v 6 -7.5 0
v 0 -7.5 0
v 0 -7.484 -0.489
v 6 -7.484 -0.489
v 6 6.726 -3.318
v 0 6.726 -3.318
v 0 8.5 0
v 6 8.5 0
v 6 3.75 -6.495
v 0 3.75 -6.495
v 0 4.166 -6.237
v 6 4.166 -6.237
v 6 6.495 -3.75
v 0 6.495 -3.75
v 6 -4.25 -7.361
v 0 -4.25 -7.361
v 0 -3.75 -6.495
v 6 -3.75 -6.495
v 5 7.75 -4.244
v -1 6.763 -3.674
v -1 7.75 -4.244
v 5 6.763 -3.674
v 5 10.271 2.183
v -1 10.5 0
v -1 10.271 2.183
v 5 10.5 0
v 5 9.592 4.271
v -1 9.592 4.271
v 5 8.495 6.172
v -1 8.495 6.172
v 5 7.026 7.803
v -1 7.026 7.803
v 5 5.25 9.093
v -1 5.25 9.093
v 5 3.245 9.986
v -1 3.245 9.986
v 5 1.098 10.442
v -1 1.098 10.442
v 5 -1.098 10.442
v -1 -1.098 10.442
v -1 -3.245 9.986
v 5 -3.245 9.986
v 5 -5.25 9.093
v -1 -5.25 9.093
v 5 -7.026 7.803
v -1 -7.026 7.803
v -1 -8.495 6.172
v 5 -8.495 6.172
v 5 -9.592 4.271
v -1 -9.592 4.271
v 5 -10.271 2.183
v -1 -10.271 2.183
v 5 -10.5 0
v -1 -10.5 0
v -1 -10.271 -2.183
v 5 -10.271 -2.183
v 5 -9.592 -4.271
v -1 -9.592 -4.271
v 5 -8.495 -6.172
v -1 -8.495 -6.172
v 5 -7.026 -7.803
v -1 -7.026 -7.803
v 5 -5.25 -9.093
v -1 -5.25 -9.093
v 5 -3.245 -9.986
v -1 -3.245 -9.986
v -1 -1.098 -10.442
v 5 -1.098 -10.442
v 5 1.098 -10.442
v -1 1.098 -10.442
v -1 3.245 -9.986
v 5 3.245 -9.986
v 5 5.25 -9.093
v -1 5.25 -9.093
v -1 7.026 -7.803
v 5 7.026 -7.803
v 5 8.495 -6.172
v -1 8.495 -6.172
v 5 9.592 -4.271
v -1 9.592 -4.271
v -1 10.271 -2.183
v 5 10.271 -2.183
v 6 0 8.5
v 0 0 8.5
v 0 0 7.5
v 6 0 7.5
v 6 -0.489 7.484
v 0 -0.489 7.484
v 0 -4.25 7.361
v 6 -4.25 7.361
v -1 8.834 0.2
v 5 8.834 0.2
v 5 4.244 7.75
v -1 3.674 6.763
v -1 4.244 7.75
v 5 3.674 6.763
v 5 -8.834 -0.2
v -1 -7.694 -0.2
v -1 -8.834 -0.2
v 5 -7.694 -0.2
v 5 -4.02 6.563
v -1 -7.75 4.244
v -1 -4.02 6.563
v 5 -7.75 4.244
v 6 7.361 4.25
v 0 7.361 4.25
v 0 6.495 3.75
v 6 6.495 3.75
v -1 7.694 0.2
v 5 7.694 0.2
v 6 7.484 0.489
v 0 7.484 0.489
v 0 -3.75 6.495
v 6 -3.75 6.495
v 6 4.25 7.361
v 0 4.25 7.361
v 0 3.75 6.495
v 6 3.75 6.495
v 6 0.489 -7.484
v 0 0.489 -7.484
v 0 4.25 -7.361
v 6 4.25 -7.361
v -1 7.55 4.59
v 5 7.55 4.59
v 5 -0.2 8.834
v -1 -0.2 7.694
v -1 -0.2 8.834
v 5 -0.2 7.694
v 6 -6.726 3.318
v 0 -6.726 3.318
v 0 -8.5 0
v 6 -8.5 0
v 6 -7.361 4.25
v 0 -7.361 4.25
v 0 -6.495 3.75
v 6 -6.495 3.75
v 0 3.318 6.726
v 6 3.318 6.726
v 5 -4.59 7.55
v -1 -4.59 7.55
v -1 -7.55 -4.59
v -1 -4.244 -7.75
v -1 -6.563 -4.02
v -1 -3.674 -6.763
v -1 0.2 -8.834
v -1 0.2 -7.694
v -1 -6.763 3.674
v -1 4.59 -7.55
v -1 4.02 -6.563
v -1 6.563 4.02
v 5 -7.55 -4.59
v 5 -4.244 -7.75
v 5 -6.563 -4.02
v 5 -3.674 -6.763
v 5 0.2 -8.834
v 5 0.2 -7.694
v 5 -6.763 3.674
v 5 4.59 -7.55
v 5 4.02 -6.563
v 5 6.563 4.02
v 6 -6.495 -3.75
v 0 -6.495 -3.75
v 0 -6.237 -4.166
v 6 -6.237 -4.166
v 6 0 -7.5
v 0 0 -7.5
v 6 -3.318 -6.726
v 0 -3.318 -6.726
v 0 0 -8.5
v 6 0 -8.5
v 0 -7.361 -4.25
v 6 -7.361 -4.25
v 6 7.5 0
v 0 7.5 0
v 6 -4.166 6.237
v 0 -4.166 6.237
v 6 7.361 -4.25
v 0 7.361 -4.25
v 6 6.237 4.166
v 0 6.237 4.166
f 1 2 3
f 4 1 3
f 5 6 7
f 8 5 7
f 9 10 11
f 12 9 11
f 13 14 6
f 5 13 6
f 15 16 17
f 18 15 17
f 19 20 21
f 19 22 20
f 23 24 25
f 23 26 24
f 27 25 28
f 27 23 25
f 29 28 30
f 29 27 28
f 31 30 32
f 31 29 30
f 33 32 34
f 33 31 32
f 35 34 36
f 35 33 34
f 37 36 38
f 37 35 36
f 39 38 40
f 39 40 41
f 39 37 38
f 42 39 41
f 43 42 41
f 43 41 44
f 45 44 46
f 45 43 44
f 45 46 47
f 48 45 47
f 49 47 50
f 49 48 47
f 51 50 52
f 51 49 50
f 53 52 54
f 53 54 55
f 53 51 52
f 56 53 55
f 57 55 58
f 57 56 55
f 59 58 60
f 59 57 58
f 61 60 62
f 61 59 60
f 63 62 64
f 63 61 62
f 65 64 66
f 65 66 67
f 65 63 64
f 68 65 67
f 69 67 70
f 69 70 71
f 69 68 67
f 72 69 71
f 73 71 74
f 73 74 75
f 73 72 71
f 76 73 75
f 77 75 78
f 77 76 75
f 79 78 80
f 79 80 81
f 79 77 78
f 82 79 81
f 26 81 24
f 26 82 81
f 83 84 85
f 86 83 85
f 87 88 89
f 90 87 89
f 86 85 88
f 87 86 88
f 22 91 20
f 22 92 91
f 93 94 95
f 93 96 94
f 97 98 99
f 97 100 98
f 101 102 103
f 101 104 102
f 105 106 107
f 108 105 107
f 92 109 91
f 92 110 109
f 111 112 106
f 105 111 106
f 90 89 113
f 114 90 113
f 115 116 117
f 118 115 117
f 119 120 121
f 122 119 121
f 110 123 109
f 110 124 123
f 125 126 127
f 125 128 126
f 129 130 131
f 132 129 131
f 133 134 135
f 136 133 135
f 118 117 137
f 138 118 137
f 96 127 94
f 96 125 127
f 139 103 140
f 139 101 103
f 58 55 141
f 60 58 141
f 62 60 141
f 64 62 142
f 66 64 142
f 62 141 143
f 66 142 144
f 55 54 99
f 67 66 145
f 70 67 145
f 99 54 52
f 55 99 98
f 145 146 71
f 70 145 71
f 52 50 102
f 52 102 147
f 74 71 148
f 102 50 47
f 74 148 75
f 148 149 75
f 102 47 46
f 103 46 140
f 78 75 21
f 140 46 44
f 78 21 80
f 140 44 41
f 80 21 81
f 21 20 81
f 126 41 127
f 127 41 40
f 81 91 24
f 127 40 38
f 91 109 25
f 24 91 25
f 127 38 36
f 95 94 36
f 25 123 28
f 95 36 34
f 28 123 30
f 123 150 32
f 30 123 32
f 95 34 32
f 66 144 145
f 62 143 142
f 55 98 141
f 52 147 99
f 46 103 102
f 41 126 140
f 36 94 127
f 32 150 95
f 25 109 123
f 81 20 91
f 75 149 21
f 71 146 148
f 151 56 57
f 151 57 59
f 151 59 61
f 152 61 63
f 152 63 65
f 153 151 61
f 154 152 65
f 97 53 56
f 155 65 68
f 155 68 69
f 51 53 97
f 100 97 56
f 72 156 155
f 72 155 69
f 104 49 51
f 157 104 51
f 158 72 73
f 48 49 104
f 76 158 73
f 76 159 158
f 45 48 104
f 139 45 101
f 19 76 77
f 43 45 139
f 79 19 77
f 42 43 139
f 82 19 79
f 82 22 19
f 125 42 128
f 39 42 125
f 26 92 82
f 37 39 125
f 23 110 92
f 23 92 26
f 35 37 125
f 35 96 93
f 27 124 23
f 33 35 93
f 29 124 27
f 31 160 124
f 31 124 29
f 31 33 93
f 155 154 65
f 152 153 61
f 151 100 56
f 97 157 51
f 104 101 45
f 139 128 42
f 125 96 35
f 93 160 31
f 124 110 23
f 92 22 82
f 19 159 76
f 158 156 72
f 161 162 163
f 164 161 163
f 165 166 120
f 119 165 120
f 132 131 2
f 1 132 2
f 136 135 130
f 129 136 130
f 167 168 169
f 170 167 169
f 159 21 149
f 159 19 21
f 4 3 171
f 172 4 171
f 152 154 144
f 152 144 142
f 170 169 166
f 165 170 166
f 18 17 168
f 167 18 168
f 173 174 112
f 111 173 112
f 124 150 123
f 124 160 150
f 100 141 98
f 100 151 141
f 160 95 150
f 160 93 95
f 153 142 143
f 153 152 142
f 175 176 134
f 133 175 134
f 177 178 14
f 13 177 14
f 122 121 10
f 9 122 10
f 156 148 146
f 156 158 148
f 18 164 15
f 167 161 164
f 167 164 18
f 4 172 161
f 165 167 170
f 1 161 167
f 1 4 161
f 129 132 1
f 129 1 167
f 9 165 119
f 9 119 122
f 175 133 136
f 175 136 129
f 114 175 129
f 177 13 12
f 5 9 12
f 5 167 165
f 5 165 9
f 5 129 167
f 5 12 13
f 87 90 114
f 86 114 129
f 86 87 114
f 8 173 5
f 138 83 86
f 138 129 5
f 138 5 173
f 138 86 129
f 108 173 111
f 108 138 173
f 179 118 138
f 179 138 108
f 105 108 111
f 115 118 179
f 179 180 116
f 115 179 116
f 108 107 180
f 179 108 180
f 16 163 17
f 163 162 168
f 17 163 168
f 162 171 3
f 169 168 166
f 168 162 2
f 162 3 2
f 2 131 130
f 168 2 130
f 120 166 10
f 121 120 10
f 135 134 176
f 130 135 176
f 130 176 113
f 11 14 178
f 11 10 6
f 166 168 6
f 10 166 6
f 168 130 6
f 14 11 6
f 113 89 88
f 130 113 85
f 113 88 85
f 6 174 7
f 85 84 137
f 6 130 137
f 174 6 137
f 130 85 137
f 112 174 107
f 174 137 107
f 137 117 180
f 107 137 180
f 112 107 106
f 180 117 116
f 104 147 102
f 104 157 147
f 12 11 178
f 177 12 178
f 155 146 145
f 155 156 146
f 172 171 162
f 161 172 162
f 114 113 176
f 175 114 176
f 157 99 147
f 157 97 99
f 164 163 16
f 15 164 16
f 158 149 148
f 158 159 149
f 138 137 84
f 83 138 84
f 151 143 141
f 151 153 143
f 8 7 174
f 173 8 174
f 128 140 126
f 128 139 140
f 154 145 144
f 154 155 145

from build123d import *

# Parameters (mm, degrees)
F1_DEPTH      = 6
F0_R          = 10.5
F2_DEPTH      = 5
F2_DEPTH_BACK = 1


with BuildPart() as f1:
    # F0 (on Right) → F1 (new body)
    with BuildSketch(Plane.YZ):
        with BuildLine():
            Line((8.5, 0), (7.5, 0))
            ThreePointArc((7.5, 0), (7.3039386076, -1.7036668737), (6.7260051156, -3.3182608675))
            Line((6.7260051156, -3.3182608675), (8.5, 0))
        make_face()
        with BuildLine():
            ThreePointArc((6.7260051156, -3.3182608675), (7.3039386076, -1.7036668737), (7.5, 0))
            Line((7.5, 0), (7.4840217299, 0.4893043502))
            ThreePointArc((7.4840217299, 0.4893043502), (7.1772298187, 2.1765505116), (6.4951905284, 3.75))
            Line((6.4951905284, 3.75), (6.2367007655, 4.1657608623))
            ThreePointArc((6.2367007655, 4.1657608623), (5.127388096, 5.473562945), (3.75, 6.4951905284))
            Line((3.75, 6.4951905284), (3.3182608675, 6.7260051156))
            ThreePointArc((3.3182608675, 6.7260051156), (1.7036668737, 7.3039386076), (0, 7.5))
            Line((0, 7.5), (-0.4893043502, 7.4840217299))
            ThreePointArc((-0.4893043502, 7.4840217299), (-2.1765505116, 7.1772298187), (-3.75, 6.4951905284))
            Line((-3.75, 6.4951905284), (-4.1657608623, 6.2367007655))
            ThreePointArc((-4.1657608623, 6.2367007655), (-5.473562945, 5.127388096), (-6.4951905284, 3.75))
            Line((-6.4951905284, 3.75), (-6.7260051156, 3.3182608675))
            ThreePointArc((-6.7260051156, 3.3182608675), (-7.3039386076, 1.7036668737), (-7.5, 0))
            Line((-7.5, 0), (-7.4840217299, -0.4893043502))
            ThreePointArc((-7.4840217299, -0.4893043502), (-7.1772298187, -2.1765505116), (-6.4951905284, -3.75))
            Line((-6.4951905284, -3.75), (-6.2367007655, -4.1657608623))
            ThreePointArc((-6.2367007655, -4.1657608623), (-5.127388096, -5.473562945), (-3.75, -6.4951905284))
            Line((-3.75, -6.4951905284), (-3.3182608675, -6.7260051156))
            ThreePointArc((-3.3182608675, -6.7260051156), (-1.7036668737, -7.3039386076), (0, -7.5))
            Line((0, -7.5), (0.4893043502, -7.4840217299))
            ThreePointArc((0.4893043502, -7.4840217299), (2.1765505116, -7.1772298187), (3.75, -6.4951905284))
            Line((3.75, -6.4951905284), (4.1657608623, -6.2367007655))
            ThreePointArc((4.1657608623, -6.2367007655), (5.473562945, -5.127388096), (6.4951905284, -3.75))
            Line((6.4951905284, -3.75), (6.7260051156, -3.3182608675))
        make_face()
        with BuildLine():
            ThreePointArc((6.4951905284, 3.75), (7.1772298187, 2.1765505116), (7.4840217299, 0.4893043502))
            Line((7.4840217299, 0.4893043502), (7.3612159322, 4.25))
            Line((7.3612159322, 4.25), (6.4951905284, 3.75))
        make_face()
        with BuildLine():
            Line((7.3612159322, -4.25), (6.4951905284, -3.75))
            ThreePointArc((6.4951905284, -3.75), (5.473562945, -5.127388096), (4.1657608623, -6.2367007655))
            Line((4.1657608623, -6.2367007655), (7.3612159322, -4.25))
        make_face()
        with BuildLine():
            ThreePointArc((3.75, 6.4951905284), (5.127388096, 5.473562945), (6.2367007655, 4.1657608623))
            Line((6.2367007655, 4.1657608623), (4.25, 7.3612159322))
            Line((4.25, 7.3612159322), (3.75, 6.4951905284))
        make_face()
        with BuildLine():
            Line((4.25, -7.3612159322), (3.75, -6.4951905284))
            ThreePointArc((3.75, -6.4951905284), (2.1765505116, -7.1772298187), (0.4893043502, -7.4840217299))
            Line((0.4893043502, -7.4840217299), (4.25, -7.3612159322))
        make_face()
        with BuildLine():
            ThreePointArc((0, 7.5), (1.7036668737, 7.3039386076), (3.3182608675, 6.7260051156))
            Line((3.3182608675, 6.7260051156), (0, 8.5))
            Line((0, 8.5), (0, 7.5))
        make_face()
        with BuildLine():
            Line((0, -8.5), (0, -7.5))
            ThreePointArc((0, -7.5), (-1.7036668737, -7.3039386076), (-3.3182608675, -6.7260051156))
            Line((-3.3182608675, -6.7260051156), (0, -8.5))
        make_face()
        with BuildLine():
            ThreePointArc((-3.75, 6.4951905284), (-2.1765505116, 7.1772298187), (-0.4893043502, 7.4840217299))
            Line((-0.4893043502, 7.4840217299), (-4.25, 7.3612159322))
            Line((-4.25, 7.3612159322), (-3.75, 6.4951905284))
        make_face()
        with BuildLine():
            Line((-4.25, -7.3612159322), (-3.75, -6.4951905284))
            ThreePointArc((-3.75, -6.4951905284), (-5.127388096, -5.473562945), (-6.2367007655, -4.1657608623))
            Line((-6.2367007655, -4.1657608623), (-4.25, -7.3612159322))
        make_face()
        with BuildLine():
            ThreePointArc((-6.4951905284, 3.75), (-5.473562945, 5.127388096), (-4.1657608623, 6.2367007655))
            Line((-4.1657608623, 6.2367007655), (-7.3612159322, 4.25))
            Line((-7.3612159322, 4.25), (-6.4951905284, 3.75))
        make_face()
        with BuildLine():
            Line((-7.3612159322, -4.25), (-6.4951905284, -3.75))
            ThreePointArc((-6.4951905284, -3.75), (-7.1772298187, -2.1765505116), (-7.4840217299, -0.4893043502))
            Line((-7.4840217299, -0.4893043502), (-7.3612159322, -4.25))
        make_face()
        with BuildLine():
            ThreePointArc((-7.5, 0), (-7.3039386076, 1.7036668737), (-6.7260051156, 3.3182608675))
            Line((-6.7260051156, 3.3182608675), (-8.5, 0))
            Line((-8.5, 0), (-7.5, 0))
        make_face()
    extrude(amount=F1_DEPTH)


with BuildPart() as f2:
    # F0 (on Right) → F2 (new body, two sides)
    with BuildSketch(Plane.YZ) as f2_sk:
        Circle(F0_R)
        Polygon((-3.6735826839, -6.7628320185), (-4.2436502465, -7.7502180007), (-6.5628319364, -4.0199929876), (-7.5502179186, -4.5900605502), (-7.6935756715, -0.2000000821), (-8.8337107967, -0.2000000821), (-6.7628320185, 3.6735826839), (-7.7502180007, 4.2436502465), (-4.0199929876, 6.5628319364), (-4.5900605502, 7.5502179186), (-0.2000000821, 7.6935756715), (-0.2000000821, 8.8337107967), (3.6735826839, 6.7628320185), (4.2436502465, 7.7502180007), (6.5628319364, 4.0199929876), (7.5502179186, 4.5900605502), (7.6935756715, 0.2000000821), (8.8337107967, 0.2000000821), (6.7628320185, -3.6735826839), (7.7502180007, -4.2436502465), (4.0199929876, -6.5628319364), (4.5900605502, -7.5502179186), (0.2000000821, -7.6935756715), (0.2000000821, -8.8337107967), align=None, mode=Mode.SUBTRACT)
    extrude(amount=F2_DEPTH)
    extrude(f2_sk.sketch, amount=-F2_DEPTH_BACK)


solid = Compound([f1.part, f2.part])
